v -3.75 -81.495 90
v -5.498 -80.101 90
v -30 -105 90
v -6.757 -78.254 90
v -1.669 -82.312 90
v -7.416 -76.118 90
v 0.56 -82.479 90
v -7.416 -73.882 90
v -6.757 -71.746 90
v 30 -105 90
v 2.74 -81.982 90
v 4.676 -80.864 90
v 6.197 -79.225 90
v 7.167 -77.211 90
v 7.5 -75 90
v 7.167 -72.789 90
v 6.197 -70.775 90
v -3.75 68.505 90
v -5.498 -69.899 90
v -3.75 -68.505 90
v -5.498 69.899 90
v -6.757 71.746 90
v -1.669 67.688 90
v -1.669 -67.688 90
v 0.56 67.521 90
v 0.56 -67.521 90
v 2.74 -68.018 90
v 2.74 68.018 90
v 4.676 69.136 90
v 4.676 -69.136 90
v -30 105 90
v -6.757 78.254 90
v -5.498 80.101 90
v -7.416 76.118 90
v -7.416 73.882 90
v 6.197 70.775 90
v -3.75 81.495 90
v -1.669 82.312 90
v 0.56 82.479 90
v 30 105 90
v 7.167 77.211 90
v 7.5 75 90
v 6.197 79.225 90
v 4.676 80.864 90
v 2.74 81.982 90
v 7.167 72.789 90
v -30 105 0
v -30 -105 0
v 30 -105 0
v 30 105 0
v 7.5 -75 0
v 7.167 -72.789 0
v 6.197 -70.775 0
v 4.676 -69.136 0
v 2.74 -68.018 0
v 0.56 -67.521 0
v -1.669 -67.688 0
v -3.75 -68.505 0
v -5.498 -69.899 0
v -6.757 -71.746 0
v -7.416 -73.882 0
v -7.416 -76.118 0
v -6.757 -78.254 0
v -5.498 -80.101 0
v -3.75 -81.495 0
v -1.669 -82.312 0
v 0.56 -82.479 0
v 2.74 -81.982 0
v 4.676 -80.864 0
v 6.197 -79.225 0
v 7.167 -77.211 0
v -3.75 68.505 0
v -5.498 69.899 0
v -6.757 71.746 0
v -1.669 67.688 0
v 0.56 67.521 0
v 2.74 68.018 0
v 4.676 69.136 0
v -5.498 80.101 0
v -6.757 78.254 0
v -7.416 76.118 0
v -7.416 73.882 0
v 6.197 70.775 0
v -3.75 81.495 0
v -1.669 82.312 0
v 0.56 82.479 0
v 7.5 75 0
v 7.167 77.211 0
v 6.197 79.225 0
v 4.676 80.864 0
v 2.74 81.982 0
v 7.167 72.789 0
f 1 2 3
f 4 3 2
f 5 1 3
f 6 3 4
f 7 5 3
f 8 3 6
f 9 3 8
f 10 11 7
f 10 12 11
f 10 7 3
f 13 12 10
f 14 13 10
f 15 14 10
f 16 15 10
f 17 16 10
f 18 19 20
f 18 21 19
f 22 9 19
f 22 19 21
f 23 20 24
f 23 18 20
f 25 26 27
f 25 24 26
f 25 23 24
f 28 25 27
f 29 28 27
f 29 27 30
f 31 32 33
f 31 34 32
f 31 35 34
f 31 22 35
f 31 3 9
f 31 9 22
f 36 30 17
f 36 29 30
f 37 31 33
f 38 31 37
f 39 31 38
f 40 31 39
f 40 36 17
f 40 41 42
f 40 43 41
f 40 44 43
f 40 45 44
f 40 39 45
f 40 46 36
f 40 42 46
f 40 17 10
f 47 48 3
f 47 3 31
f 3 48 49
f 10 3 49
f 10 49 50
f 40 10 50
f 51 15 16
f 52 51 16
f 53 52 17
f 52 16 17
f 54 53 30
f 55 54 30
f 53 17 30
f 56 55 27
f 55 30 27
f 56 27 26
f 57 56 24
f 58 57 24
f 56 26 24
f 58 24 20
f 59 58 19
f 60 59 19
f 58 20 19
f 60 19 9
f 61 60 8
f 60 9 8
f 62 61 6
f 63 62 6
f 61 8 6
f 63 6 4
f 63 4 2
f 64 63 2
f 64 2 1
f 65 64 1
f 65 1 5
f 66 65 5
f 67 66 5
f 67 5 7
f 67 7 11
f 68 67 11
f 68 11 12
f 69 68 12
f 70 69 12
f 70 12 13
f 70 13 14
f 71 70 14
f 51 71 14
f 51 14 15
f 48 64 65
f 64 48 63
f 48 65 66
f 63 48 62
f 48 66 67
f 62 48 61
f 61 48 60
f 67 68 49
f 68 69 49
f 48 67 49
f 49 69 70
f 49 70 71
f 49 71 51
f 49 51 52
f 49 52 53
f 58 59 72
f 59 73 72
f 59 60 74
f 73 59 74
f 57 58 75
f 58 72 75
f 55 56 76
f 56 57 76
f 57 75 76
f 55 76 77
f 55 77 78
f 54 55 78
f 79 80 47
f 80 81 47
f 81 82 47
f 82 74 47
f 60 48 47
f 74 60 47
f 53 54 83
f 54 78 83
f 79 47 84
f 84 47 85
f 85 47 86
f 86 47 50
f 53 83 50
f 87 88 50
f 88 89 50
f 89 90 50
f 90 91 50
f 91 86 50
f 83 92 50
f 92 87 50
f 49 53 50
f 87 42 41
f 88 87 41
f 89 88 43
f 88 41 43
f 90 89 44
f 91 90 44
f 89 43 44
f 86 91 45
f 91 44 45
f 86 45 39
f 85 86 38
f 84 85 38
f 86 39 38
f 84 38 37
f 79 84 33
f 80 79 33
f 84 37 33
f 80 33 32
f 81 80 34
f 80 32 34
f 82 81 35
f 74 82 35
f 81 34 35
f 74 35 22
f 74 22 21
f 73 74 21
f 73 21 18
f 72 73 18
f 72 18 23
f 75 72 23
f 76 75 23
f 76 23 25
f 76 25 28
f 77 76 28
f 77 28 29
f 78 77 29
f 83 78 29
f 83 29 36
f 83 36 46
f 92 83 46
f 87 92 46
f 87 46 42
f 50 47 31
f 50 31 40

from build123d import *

# Parameters (mm, degrees)
SKETCH1_W           = 60
SKETCH1_H           = 210
BOSS_EXTRUDE1_DEPTH = 90
CUT_EXTRUDE1_REACH  = 143.51
SKETCH2_R           = 7.5


with BuildPart() as part:
    # Sketch1 → Boss-Extrude1 (new body)
    with BuildSketch(Plane.XY):
        Rectangle(SKETCH1_W, SKETCH1_H)
    extrude(amount=BOSS_EXTRUDE1_DEPTH)

    # Sketch2 → Cut-Extrude1 (cut, up to next)
    with BuildSketch(Plane.XY.offset(90), mode=Mode.PRIVATE) as cut_extrude1_sk1:
        with Locations((0, 75)):
            Circle(SKETCH2_R)
    cut_extrude1_tool1 = extrude(cut_extrude1_sk1.sketch, amount=-CUT_EXTRUDE1_REACH, mode=Mode.PRIVATE) & part.part
    # Sketch2 → Cut-Extrude1 (cut, up to next)
    with BuildSketch(Plane.XY.offset(90), mode=Mode.PRIVATE) as cut_extrude1_sk2:
        with Locations((0, -75)):
            Circle(SKETCH2_R)
    cut_extrude1_tool2 = extrude(cut_extrude1_sk2.sketch, amount=-CUT_EXTRUDE1_REACH, mode=Mode.PRIVATE) & part.part
    add(cut_extrude1_tool1.solids().sort_by_distance((0, 75, 90))[0], mode=Mode.SUBTRACT)
    add(cut_extrude1_tool2.solids().sort_by_distance((0, -75, 90))[0], mode=Mode.SUBTRACT)


solid = part.part
